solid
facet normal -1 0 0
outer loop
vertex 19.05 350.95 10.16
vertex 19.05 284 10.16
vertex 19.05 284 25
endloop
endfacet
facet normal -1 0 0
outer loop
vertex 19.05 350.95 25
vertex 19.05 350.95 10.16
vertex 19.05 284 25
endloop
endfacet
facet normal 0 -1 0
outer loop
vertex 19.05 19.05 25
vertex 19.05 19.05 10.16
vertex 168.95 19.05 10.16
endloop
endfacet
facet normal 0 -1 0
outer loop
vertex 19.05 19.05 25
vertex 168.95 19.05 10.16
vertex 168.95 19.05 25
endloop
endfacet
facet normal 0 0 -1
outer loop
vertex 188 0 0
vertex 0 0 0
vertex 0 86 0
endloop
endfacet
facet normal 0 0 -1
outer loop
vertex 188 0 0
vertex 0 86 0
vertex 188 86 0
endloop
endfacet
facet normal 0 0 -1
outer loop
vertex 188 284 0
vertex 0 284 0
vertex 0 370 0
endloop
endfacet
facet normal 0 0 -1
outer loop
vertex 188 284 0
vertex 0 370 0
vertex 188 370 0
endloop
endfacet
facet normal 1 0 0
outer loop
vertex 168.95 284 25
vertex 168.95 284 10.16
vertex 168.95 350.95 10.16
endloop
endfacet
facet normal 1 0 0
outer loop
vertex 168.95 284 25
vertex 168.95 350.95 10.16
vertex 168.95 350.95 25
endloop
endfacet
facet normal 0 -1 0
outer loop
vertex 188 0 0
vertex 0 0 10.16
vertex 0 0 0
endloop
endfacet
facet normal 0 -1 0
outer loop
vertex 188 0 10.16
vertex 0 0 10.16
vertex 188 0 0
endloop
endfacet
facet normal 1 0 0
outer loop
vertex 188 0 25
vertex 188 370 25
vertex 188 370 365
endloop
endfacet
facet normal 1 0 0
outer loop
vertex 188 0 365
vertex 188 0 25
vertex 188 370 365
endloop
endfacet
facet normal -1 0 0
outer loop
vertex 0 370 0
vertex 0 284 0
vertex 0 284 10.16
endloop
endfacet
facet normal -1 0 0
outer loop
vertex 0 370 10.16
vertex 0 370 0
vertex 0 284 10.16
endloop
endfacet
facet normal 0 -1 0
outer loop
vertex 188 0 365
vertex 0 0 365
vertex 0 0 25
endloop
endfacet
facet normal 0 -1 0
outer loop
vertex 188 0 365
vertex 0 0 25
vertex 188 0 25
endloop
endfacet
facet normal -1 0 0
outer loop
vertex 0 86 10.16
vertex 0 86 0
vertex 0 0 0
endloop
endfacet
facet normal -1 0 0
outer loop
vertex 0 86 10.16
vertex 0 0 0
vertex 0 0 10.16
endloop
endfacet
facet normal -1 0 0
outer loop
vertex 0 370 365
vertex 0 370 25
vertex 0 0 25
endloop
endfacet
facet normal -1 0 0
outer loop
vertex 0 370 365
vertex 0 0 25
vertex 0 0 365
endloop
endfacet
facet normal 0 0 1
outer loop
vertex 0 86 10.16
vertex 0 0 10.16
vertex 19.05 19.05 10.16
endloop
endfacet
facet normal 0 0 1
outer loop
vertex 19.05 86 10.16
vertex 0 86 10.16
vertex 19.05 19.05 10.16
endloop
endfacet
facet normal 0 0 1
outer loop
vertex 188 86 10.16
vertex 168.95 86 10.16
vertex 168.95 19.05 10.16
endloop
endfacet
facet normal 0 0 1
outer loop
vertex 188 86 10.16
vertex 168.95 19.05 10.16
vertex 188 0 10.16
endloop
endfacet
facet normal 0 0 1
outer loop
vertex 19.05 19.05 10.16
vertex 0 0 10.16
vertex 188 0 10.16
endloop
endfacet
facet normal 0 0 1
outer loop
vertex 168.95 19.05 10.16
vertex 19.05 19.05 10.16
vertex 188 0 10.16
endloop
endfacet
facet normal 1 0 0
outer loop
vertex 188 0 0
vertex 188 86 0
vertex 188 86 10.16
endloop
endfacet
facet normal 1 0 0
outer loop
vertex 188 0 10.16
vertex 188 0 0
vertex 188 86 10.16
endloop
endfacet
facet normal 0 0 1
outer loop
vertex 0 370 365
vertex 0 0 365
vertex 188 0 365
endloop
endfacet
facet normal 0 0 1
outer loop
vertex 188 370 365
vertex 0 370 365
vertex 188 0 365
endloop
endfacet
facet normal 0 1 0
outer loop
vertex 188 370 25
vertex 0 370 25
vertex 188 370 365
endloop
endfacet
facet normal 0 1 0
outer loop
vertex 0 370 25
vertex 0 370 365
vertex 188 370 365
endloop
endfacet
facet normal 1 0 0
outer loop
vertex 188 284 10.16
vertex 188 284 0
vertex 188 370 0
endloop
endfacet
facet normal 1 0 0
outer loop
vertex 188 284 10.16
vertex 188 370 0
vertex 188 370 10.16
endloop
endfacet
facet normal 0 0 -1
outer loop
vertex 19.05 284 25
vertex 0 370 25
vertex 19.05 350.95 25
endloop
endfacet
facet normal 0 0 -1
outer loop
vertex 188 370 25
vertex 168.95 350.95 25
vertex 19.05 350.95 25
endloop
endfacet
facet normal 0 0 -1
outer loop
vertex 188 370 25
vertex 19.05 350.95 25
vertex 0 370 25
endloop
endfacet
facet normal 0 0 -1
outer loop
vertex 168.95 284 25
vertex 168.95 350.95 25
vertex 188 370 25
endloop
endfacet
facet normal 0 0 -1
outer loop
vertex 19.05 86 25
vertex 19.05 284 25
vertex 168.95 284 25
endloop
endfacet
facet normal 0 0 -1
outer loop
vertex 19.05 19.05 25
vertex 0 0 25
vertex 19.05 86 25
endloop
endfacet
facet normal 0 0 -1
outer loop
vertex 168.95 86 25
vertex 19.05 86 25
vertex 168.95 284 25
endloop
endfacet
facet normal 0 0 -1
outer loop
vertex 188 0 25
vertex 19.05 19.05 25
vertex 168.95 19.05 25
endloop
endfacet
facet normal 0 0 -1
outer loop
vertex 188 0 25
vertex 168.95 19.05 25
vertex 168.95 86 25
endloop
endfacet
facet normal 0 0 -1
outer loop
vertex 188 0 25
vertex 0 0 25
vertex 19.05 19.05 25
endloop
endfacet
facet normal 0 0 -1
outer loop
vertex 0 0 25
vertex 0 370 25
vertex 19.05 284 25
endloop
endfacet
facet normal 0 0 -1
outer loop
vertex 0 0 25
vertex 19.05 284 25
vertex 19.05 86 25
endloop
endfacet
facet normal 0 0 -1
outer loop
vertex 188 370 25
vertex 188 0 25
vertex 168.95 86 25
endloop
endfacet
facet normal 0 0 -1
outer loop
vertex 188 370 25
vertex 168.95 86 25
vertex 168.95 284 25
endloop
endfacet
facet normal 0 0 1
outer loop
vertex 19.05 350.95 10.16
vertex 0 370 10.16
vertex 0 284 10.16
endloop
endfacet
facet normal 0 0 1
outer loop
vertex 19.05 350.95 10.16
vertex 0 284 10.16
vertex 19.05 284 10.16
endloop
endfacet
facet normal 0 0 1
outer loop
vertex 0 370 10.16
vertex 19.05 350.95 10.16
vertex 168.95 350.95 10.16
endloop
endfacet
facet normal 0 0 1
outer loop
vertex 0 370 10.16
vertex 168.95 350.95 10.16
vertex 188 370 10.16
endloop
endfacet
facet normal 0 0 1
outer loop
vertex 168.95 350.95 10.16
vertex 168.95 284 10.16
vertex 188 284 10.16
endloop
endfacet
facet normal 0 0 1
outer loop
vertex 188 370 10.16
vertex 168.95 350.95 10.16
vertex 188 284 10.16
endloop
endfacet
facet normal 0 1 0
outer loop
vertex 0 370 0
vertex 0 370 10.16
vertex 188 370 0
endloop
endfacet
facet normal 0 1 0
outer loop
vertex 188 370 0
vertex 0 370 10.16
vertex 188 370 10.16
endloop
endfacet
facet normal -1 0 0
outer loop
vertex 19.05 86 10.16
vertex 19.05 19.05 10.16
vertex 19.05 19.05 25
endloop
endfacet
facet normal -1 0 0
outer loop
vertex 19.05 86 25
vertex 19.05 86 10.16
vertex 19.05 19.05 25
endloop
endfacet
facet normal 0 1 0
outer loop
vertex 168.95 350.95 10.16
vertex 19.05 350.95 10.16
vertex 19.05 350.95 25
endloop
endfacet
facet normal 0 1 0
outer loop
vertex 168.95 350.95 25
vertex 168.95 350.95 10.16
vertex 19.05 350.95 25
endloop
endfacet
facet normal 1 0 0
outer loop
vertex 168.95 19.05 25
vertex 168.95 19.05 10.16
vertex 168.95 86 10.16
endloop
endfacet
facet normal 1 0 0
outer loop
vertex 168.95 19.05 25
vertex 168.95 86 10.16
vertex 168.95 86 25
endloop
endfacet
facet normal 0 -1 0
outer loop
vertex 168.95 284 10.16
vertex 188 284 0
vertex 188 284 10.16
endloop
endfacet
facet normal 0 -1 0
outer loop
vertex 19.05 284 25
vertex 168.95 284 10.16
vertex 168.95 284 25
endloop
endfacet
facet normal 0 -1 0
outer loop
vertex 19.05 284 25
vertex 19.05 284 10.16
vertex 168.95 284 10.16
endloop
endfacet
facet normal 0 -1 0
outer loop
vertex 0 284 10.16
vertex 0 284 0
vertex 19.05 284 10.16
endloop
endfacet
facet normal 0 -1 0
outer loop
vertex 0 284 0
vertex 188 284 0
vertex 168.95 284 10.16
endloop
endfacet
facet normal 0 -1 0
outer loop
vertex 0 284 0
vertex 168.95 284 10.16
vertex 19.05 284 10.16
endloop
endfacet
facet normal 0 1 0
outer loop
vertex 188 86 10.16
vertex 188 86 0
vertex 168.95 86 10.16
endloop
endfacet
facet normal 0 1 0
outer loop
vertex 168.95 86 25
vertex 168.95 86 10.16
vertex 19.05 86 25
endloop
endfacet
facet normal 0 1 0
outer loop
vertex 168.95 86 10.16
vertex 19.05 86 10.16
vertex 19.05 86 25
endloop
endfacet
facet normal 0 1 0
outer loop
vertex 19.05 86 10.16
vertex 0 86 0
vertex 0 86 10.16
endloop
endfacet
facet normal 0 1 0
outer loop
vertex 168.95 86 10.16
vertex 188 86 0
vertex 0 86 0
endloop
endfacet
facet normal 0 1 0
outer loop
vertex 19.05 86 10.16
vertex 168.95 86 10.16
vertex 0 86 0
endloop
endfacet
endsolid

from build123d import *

# Parameters (mm, degrees)
F0_W     = 188
F0_H     = 365
F1_DEPTH = 370
F2_W     = 198
F2_H     = 25
F3_DEPTH = 188.001
F4_W     = 19.05
F4_H     = 14.84
F5_DEPTH = 370.001
F6_W     = 19.05
F6_H     = 14.84
F7_DEPTH = 188.001


with BuildPart() as f1:
    # F0 (on Front) → F1 (new body)
    with BuildSketch(Plane.XZ):
        with Locations((94, 182.5)):
            Rectangle(F0_W, F0_H)
    extrude(amount=-F1_DEPTH)

    # F2 (on face) → F3 (cut, through all)
    with BuildSketch(Plane(origin=(0, 0, 0), x_dir=(0, -1, 0), z_dir=(-1, 0, 0))):
        with Locations((-185, 12.5)):
            Rectangle(F2_W, F2_H)
    extrude(amount=-F3_DEPTH, mode=Mode.SUBTRACT)

    # F4 (on face) → F5 (cut, through all)
    with BuildSketch(Plane.XZ):
        with Locations((9.525, 17.58)):
            Rectangle(F4_W, F4_H)
        with Locations((178.475, 17.58)):
            Rectangle(F4_W, F4_H)
    extrude(amount=-F5_DEPTH, mode=Mode.SUBTRACT)

    # F6 (on face) → F7 (cut, through all)
    with BuildSketch(Plane(origin=(0, 0, 0), x_dir=(0, -1, 0), z_dir=(-1, 0, 0))):
        with Locations((-360.475, 17.58)):
            Rectangle(F6_W, F6_H)
        with Locations((-9.525, 17.58)):
            Rectangle(F6_W, F6_H)
    extrude(amount=-F7_DEPTH, mode=Mode.SUBTRACT)


solid = f1.part
